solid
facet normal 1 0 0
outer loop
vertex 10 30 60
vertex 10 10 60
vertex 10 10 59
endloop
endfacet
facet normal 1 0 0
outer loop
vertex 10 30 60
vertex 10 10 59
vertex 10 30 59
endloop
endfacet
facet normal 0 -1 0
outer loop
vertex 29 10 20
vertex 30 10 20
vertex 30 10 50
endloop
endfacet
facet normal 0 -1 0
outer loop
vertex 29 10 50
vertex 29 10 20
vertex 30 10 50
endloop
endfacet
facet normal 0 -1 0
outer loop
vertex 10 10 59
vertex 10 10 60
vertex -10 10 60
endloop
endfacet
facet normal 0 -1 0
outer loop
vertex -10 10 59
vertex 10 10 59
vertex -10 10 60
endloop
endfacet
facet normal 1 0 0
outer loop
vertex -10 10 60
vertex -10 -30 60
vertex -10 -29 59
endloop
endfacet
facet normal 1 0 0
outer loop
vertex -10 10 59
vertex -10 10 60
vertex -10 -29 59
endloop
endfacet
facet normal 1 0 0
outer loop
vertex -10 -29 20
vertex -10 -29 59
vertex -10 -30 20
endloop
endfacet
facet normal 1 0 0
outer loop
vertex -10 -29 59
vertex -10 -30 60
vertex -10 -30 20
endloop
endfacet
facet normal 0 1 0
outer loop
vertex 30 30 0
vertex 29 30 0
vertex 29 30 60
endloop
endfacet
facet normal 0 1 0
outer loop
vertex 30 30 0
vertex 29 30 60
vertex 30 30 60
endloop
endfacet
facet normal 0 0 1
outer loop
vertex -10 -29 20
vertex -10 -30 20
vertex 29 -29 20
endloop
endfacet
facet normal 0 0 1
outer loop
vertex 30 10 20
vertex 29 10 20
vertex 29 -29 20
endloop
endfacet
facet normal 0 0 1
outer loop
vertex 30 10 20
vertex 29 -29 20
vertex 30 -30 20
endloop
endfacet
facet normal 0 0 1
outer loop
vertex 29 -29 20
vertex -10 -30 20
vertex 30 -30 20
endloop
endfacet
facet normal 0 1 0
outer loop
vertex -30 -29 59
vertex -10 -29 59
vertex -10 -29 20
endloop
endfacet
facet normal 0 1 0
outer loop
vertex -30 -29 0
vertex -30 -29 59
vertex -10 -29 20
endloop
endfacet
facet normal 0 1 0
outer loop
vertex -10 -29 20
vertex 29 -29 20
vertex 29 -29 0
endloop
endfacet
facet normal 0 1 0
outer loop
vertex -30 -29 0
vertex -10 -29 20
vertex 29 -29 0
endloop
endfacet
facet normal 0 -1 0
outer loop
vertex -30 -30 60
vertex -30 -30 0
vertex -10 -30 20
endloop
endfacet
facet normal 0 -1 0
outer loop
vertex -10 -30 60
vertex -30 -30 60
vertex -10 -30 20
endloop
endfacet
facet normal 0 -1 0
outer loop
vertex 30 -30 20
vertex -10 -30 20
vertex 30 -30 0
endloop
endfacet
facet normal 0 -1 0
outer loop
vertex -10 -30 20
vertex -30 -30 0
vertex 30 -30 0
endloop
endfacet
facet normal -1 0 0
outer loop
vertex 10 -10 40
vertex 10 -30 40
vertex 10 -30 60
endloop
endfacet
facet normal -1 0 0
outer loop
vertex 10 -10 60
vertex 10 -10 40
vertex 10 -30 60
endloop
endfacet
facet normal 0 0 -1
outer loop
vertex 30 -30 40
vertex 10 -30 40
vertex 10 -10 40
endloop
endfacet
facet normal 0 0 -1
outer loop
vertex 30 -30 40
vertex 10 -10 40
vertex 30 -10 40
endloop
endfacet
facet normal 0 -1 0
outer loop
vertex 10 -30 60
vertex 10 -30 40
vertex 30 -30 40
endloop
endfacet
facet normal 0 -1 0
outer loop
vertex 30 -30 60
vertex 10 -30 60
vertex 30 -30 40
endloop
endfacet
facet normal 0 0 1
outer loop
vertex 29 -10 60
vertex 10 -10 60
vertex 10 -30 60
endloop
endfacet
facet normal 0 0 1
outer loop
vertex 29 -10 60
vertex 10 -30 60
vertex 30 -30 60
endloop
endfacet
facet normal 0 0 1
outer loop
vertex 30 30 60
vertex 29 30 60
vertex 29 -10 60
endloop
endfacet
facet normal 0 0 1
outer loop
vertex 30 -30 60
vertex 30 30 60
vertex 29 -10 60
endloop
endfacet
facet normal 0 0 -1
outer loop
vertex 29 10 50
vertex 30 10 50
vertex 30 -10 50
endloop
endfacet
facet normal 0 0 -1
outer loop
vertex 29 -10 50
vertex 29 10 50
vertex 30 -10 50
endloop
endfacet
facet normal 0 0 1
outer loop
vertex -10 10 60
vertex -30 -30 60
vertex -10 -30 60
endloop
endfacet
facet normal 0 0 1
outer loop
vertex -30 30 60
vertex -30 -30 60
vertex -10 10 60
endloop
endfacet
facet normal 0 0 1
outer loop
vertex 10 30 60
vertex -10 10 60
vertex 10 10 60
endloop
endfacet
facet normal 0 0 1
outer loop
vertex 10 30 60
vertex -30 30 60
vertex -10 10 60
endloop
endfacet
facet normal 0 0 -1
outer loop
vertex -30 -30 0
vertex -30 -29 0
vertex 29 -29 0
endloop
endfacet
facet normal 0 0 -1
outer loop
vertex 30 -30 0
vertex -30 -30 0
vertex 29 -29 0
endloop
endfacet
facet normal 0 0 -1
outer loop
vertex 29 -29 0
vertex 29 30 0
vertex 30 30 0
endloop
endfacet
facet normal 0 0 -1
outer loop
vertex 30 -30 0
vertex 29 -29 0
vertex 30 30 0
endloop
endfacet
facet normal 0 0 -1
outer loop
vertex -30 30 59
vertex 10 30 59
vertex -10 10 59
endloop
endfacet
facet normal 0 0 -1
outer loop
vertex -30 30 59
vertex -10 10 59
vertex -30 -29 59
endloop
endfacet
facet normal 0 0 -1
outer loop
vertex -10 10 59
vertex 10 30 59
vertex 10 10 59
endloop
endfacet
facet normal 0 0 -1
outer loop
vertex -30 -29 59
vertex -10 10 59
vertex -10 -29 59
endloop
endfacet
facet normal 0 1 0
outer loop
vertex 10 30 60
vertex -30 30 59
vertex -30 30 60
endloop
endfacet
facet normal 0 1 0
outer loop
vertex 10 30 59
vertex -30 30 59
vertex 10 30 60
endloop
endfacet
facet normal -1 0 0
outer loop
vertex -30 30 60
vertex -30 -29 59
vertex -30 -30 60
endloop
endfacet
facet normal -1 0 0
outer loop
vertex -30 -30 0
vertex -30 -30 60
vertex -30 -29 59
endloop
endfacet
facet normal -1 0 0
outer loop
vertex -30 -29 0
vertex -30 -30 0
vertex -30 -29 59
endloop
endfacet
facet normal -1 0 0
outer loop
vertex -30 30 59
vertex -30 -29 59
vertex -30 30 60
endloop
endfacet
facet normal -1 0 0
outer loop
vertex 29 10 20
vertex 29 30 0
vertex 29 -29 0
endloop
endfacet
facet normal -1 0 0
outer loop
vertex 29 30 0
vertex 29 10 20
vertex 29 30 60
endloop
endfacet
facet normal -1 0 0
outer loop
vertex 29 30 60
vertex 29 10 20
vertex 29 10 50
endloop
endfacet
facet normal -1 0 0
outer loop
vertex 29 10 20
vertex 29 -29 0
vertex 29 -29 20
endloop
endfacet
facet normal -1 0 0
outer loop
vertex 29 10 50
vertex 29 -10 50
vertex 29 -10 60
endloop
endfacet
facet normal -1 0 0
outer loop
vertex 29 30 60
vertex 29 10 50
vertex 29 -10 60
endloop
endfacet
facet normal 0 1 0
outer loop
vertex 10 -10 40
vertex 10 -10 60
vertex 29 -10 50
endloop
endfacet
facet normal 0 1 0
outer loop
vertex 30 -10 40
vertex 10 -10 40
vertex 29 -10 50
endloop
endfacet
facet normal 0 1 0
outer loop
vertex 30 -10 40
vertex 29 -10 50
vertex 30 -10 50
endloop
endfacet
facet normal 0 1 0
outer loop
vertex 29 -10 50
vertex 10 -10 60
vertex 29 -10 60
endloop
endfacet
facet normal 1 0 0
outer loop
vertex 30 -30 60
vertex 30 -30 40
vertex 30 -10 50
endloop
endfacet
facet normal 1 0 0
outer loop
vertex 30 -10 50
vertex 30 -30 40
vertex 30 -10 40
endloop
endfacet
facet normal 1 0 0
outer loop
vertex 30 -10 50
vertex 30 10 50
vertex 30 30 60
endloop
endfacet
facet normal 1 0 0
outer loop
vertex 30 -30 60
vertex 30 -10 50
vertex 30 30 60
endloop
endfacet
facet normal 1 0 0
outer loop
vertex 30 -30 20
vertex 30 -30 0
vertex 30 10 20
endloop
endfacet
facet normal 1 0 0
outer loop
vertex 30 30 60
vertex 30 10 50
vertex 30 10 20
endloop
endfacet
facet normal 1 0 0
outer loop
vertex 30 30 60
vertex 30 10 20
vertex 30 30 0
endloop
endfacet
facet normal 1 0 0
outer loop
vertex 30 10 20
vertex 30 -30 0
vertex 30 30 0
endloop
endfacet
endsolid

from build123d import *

# Parameters (mm, degrees)
F0_W      = 60
F0_H      = 60
F1_DEPTH  = 60
F2_W      = 19
F2_H      = 20
F3_DEPTH  = 60.001
F5_DEPTH  = 60.001
F6_W      = 19
F6_H      = 19
F5_FACE_W = 20
F5_FACE_H = 20
F7_DEPTH  = 25
F9_DEPTH  = 60.001
F11_DEPTH = 20.001
F12_W     = 1
F12_H     = 20
F12_W_2   = 20
F12_H_2   = 1
F13_DEPTH = 2


with BuildPart() as f1:
    # F0 (on Top) → F1 (new body)
    with BuildSketch(Plane.XY):
        Rectangle(F0_W, F0_H)
    extrude(amount=F1_DEPTH)

    # F2 (on face) → F3 (cut, through all)
    with BuildSketch(Plane.XY.offset(60)):
        Polygon((10, -10), (29, -10), (29, 10), (10, 10), (-10, 10), (-10, -29), (10, -29), align=None)
        with Locations((19.5, 20)):
            Rectangle(F2_W, F2_H)
    extrude(amount=-F3_DEPTH, mode=Mode.SUBTRACT)

    # F4 (on face) → F5 (cut, through all)
    with BuildSketch(Plane.XZ.offset(30)):
        Polygon((10, 59), (-10, 59), (-10, 20), (29, 20), (29, 40), (10, 40), align=None)
    extrude(amount=-F5_DEPTH, mode=Mode.SUBTRACT)

    # F6 (on face) + F5_face (on face) → F7 (cut)
    with BuildSketch(Plane.XY.offset(20)):
        with Locations((19.5, -19.5)):
            Rectangle(F6_W, F6_H)
    with BuildSketch(Plane(origin=(18.525, -20.475, 20), x_dir=(1, 0, 0), z_dir=(0, 0, 1))):
        with Locations((-18.525, 40.475)):
            Rectangle(F5_FACE_W, F5_FACE_H)
    extrude(amount=-F7_DEPTH, mode=Mode.SUBTRACT)

    # F8 (on face) → F9 (cut, through all)
    with BuildSketch(Plane.YZ.offset(30)):
        Polygon((-29, 40), (-29, 20), (10, 20), (10, 50), (-10, 50), (-10, 40), align=None)
    extrude(amount=-F9_DEPTH, mode=Mode.SUBTRACT)

    # F10 (on face) → F11 (cut, through all)
    with BuildSketch(Plane.YZ.offset(-10)):
        Polygon((30, 0), (30, 59), (10, 59), (-29, 59), (-29, 40), (-10, 40), (-10, 50), (10, 50), (10, 20), (-29, 20), (-29, 0), align=None)
    extrude(amount=-F11_DEPTH, mode=Mode.SUBTRACT)

    # F12 (on face) → F13 (cut)
    with BuildSketch(Plane.XZ.offset(30)):
        with Locations((29.5, 30)):
            Rectangle(F12_W, F12_H)
        with Locations((0, 59.5)):
            Rectangle(F12_W_2, F12_H_2)
    extrude(amount=-F13_DEPTH, mode=Mode.SUBTRACT)


solid = f1.part
